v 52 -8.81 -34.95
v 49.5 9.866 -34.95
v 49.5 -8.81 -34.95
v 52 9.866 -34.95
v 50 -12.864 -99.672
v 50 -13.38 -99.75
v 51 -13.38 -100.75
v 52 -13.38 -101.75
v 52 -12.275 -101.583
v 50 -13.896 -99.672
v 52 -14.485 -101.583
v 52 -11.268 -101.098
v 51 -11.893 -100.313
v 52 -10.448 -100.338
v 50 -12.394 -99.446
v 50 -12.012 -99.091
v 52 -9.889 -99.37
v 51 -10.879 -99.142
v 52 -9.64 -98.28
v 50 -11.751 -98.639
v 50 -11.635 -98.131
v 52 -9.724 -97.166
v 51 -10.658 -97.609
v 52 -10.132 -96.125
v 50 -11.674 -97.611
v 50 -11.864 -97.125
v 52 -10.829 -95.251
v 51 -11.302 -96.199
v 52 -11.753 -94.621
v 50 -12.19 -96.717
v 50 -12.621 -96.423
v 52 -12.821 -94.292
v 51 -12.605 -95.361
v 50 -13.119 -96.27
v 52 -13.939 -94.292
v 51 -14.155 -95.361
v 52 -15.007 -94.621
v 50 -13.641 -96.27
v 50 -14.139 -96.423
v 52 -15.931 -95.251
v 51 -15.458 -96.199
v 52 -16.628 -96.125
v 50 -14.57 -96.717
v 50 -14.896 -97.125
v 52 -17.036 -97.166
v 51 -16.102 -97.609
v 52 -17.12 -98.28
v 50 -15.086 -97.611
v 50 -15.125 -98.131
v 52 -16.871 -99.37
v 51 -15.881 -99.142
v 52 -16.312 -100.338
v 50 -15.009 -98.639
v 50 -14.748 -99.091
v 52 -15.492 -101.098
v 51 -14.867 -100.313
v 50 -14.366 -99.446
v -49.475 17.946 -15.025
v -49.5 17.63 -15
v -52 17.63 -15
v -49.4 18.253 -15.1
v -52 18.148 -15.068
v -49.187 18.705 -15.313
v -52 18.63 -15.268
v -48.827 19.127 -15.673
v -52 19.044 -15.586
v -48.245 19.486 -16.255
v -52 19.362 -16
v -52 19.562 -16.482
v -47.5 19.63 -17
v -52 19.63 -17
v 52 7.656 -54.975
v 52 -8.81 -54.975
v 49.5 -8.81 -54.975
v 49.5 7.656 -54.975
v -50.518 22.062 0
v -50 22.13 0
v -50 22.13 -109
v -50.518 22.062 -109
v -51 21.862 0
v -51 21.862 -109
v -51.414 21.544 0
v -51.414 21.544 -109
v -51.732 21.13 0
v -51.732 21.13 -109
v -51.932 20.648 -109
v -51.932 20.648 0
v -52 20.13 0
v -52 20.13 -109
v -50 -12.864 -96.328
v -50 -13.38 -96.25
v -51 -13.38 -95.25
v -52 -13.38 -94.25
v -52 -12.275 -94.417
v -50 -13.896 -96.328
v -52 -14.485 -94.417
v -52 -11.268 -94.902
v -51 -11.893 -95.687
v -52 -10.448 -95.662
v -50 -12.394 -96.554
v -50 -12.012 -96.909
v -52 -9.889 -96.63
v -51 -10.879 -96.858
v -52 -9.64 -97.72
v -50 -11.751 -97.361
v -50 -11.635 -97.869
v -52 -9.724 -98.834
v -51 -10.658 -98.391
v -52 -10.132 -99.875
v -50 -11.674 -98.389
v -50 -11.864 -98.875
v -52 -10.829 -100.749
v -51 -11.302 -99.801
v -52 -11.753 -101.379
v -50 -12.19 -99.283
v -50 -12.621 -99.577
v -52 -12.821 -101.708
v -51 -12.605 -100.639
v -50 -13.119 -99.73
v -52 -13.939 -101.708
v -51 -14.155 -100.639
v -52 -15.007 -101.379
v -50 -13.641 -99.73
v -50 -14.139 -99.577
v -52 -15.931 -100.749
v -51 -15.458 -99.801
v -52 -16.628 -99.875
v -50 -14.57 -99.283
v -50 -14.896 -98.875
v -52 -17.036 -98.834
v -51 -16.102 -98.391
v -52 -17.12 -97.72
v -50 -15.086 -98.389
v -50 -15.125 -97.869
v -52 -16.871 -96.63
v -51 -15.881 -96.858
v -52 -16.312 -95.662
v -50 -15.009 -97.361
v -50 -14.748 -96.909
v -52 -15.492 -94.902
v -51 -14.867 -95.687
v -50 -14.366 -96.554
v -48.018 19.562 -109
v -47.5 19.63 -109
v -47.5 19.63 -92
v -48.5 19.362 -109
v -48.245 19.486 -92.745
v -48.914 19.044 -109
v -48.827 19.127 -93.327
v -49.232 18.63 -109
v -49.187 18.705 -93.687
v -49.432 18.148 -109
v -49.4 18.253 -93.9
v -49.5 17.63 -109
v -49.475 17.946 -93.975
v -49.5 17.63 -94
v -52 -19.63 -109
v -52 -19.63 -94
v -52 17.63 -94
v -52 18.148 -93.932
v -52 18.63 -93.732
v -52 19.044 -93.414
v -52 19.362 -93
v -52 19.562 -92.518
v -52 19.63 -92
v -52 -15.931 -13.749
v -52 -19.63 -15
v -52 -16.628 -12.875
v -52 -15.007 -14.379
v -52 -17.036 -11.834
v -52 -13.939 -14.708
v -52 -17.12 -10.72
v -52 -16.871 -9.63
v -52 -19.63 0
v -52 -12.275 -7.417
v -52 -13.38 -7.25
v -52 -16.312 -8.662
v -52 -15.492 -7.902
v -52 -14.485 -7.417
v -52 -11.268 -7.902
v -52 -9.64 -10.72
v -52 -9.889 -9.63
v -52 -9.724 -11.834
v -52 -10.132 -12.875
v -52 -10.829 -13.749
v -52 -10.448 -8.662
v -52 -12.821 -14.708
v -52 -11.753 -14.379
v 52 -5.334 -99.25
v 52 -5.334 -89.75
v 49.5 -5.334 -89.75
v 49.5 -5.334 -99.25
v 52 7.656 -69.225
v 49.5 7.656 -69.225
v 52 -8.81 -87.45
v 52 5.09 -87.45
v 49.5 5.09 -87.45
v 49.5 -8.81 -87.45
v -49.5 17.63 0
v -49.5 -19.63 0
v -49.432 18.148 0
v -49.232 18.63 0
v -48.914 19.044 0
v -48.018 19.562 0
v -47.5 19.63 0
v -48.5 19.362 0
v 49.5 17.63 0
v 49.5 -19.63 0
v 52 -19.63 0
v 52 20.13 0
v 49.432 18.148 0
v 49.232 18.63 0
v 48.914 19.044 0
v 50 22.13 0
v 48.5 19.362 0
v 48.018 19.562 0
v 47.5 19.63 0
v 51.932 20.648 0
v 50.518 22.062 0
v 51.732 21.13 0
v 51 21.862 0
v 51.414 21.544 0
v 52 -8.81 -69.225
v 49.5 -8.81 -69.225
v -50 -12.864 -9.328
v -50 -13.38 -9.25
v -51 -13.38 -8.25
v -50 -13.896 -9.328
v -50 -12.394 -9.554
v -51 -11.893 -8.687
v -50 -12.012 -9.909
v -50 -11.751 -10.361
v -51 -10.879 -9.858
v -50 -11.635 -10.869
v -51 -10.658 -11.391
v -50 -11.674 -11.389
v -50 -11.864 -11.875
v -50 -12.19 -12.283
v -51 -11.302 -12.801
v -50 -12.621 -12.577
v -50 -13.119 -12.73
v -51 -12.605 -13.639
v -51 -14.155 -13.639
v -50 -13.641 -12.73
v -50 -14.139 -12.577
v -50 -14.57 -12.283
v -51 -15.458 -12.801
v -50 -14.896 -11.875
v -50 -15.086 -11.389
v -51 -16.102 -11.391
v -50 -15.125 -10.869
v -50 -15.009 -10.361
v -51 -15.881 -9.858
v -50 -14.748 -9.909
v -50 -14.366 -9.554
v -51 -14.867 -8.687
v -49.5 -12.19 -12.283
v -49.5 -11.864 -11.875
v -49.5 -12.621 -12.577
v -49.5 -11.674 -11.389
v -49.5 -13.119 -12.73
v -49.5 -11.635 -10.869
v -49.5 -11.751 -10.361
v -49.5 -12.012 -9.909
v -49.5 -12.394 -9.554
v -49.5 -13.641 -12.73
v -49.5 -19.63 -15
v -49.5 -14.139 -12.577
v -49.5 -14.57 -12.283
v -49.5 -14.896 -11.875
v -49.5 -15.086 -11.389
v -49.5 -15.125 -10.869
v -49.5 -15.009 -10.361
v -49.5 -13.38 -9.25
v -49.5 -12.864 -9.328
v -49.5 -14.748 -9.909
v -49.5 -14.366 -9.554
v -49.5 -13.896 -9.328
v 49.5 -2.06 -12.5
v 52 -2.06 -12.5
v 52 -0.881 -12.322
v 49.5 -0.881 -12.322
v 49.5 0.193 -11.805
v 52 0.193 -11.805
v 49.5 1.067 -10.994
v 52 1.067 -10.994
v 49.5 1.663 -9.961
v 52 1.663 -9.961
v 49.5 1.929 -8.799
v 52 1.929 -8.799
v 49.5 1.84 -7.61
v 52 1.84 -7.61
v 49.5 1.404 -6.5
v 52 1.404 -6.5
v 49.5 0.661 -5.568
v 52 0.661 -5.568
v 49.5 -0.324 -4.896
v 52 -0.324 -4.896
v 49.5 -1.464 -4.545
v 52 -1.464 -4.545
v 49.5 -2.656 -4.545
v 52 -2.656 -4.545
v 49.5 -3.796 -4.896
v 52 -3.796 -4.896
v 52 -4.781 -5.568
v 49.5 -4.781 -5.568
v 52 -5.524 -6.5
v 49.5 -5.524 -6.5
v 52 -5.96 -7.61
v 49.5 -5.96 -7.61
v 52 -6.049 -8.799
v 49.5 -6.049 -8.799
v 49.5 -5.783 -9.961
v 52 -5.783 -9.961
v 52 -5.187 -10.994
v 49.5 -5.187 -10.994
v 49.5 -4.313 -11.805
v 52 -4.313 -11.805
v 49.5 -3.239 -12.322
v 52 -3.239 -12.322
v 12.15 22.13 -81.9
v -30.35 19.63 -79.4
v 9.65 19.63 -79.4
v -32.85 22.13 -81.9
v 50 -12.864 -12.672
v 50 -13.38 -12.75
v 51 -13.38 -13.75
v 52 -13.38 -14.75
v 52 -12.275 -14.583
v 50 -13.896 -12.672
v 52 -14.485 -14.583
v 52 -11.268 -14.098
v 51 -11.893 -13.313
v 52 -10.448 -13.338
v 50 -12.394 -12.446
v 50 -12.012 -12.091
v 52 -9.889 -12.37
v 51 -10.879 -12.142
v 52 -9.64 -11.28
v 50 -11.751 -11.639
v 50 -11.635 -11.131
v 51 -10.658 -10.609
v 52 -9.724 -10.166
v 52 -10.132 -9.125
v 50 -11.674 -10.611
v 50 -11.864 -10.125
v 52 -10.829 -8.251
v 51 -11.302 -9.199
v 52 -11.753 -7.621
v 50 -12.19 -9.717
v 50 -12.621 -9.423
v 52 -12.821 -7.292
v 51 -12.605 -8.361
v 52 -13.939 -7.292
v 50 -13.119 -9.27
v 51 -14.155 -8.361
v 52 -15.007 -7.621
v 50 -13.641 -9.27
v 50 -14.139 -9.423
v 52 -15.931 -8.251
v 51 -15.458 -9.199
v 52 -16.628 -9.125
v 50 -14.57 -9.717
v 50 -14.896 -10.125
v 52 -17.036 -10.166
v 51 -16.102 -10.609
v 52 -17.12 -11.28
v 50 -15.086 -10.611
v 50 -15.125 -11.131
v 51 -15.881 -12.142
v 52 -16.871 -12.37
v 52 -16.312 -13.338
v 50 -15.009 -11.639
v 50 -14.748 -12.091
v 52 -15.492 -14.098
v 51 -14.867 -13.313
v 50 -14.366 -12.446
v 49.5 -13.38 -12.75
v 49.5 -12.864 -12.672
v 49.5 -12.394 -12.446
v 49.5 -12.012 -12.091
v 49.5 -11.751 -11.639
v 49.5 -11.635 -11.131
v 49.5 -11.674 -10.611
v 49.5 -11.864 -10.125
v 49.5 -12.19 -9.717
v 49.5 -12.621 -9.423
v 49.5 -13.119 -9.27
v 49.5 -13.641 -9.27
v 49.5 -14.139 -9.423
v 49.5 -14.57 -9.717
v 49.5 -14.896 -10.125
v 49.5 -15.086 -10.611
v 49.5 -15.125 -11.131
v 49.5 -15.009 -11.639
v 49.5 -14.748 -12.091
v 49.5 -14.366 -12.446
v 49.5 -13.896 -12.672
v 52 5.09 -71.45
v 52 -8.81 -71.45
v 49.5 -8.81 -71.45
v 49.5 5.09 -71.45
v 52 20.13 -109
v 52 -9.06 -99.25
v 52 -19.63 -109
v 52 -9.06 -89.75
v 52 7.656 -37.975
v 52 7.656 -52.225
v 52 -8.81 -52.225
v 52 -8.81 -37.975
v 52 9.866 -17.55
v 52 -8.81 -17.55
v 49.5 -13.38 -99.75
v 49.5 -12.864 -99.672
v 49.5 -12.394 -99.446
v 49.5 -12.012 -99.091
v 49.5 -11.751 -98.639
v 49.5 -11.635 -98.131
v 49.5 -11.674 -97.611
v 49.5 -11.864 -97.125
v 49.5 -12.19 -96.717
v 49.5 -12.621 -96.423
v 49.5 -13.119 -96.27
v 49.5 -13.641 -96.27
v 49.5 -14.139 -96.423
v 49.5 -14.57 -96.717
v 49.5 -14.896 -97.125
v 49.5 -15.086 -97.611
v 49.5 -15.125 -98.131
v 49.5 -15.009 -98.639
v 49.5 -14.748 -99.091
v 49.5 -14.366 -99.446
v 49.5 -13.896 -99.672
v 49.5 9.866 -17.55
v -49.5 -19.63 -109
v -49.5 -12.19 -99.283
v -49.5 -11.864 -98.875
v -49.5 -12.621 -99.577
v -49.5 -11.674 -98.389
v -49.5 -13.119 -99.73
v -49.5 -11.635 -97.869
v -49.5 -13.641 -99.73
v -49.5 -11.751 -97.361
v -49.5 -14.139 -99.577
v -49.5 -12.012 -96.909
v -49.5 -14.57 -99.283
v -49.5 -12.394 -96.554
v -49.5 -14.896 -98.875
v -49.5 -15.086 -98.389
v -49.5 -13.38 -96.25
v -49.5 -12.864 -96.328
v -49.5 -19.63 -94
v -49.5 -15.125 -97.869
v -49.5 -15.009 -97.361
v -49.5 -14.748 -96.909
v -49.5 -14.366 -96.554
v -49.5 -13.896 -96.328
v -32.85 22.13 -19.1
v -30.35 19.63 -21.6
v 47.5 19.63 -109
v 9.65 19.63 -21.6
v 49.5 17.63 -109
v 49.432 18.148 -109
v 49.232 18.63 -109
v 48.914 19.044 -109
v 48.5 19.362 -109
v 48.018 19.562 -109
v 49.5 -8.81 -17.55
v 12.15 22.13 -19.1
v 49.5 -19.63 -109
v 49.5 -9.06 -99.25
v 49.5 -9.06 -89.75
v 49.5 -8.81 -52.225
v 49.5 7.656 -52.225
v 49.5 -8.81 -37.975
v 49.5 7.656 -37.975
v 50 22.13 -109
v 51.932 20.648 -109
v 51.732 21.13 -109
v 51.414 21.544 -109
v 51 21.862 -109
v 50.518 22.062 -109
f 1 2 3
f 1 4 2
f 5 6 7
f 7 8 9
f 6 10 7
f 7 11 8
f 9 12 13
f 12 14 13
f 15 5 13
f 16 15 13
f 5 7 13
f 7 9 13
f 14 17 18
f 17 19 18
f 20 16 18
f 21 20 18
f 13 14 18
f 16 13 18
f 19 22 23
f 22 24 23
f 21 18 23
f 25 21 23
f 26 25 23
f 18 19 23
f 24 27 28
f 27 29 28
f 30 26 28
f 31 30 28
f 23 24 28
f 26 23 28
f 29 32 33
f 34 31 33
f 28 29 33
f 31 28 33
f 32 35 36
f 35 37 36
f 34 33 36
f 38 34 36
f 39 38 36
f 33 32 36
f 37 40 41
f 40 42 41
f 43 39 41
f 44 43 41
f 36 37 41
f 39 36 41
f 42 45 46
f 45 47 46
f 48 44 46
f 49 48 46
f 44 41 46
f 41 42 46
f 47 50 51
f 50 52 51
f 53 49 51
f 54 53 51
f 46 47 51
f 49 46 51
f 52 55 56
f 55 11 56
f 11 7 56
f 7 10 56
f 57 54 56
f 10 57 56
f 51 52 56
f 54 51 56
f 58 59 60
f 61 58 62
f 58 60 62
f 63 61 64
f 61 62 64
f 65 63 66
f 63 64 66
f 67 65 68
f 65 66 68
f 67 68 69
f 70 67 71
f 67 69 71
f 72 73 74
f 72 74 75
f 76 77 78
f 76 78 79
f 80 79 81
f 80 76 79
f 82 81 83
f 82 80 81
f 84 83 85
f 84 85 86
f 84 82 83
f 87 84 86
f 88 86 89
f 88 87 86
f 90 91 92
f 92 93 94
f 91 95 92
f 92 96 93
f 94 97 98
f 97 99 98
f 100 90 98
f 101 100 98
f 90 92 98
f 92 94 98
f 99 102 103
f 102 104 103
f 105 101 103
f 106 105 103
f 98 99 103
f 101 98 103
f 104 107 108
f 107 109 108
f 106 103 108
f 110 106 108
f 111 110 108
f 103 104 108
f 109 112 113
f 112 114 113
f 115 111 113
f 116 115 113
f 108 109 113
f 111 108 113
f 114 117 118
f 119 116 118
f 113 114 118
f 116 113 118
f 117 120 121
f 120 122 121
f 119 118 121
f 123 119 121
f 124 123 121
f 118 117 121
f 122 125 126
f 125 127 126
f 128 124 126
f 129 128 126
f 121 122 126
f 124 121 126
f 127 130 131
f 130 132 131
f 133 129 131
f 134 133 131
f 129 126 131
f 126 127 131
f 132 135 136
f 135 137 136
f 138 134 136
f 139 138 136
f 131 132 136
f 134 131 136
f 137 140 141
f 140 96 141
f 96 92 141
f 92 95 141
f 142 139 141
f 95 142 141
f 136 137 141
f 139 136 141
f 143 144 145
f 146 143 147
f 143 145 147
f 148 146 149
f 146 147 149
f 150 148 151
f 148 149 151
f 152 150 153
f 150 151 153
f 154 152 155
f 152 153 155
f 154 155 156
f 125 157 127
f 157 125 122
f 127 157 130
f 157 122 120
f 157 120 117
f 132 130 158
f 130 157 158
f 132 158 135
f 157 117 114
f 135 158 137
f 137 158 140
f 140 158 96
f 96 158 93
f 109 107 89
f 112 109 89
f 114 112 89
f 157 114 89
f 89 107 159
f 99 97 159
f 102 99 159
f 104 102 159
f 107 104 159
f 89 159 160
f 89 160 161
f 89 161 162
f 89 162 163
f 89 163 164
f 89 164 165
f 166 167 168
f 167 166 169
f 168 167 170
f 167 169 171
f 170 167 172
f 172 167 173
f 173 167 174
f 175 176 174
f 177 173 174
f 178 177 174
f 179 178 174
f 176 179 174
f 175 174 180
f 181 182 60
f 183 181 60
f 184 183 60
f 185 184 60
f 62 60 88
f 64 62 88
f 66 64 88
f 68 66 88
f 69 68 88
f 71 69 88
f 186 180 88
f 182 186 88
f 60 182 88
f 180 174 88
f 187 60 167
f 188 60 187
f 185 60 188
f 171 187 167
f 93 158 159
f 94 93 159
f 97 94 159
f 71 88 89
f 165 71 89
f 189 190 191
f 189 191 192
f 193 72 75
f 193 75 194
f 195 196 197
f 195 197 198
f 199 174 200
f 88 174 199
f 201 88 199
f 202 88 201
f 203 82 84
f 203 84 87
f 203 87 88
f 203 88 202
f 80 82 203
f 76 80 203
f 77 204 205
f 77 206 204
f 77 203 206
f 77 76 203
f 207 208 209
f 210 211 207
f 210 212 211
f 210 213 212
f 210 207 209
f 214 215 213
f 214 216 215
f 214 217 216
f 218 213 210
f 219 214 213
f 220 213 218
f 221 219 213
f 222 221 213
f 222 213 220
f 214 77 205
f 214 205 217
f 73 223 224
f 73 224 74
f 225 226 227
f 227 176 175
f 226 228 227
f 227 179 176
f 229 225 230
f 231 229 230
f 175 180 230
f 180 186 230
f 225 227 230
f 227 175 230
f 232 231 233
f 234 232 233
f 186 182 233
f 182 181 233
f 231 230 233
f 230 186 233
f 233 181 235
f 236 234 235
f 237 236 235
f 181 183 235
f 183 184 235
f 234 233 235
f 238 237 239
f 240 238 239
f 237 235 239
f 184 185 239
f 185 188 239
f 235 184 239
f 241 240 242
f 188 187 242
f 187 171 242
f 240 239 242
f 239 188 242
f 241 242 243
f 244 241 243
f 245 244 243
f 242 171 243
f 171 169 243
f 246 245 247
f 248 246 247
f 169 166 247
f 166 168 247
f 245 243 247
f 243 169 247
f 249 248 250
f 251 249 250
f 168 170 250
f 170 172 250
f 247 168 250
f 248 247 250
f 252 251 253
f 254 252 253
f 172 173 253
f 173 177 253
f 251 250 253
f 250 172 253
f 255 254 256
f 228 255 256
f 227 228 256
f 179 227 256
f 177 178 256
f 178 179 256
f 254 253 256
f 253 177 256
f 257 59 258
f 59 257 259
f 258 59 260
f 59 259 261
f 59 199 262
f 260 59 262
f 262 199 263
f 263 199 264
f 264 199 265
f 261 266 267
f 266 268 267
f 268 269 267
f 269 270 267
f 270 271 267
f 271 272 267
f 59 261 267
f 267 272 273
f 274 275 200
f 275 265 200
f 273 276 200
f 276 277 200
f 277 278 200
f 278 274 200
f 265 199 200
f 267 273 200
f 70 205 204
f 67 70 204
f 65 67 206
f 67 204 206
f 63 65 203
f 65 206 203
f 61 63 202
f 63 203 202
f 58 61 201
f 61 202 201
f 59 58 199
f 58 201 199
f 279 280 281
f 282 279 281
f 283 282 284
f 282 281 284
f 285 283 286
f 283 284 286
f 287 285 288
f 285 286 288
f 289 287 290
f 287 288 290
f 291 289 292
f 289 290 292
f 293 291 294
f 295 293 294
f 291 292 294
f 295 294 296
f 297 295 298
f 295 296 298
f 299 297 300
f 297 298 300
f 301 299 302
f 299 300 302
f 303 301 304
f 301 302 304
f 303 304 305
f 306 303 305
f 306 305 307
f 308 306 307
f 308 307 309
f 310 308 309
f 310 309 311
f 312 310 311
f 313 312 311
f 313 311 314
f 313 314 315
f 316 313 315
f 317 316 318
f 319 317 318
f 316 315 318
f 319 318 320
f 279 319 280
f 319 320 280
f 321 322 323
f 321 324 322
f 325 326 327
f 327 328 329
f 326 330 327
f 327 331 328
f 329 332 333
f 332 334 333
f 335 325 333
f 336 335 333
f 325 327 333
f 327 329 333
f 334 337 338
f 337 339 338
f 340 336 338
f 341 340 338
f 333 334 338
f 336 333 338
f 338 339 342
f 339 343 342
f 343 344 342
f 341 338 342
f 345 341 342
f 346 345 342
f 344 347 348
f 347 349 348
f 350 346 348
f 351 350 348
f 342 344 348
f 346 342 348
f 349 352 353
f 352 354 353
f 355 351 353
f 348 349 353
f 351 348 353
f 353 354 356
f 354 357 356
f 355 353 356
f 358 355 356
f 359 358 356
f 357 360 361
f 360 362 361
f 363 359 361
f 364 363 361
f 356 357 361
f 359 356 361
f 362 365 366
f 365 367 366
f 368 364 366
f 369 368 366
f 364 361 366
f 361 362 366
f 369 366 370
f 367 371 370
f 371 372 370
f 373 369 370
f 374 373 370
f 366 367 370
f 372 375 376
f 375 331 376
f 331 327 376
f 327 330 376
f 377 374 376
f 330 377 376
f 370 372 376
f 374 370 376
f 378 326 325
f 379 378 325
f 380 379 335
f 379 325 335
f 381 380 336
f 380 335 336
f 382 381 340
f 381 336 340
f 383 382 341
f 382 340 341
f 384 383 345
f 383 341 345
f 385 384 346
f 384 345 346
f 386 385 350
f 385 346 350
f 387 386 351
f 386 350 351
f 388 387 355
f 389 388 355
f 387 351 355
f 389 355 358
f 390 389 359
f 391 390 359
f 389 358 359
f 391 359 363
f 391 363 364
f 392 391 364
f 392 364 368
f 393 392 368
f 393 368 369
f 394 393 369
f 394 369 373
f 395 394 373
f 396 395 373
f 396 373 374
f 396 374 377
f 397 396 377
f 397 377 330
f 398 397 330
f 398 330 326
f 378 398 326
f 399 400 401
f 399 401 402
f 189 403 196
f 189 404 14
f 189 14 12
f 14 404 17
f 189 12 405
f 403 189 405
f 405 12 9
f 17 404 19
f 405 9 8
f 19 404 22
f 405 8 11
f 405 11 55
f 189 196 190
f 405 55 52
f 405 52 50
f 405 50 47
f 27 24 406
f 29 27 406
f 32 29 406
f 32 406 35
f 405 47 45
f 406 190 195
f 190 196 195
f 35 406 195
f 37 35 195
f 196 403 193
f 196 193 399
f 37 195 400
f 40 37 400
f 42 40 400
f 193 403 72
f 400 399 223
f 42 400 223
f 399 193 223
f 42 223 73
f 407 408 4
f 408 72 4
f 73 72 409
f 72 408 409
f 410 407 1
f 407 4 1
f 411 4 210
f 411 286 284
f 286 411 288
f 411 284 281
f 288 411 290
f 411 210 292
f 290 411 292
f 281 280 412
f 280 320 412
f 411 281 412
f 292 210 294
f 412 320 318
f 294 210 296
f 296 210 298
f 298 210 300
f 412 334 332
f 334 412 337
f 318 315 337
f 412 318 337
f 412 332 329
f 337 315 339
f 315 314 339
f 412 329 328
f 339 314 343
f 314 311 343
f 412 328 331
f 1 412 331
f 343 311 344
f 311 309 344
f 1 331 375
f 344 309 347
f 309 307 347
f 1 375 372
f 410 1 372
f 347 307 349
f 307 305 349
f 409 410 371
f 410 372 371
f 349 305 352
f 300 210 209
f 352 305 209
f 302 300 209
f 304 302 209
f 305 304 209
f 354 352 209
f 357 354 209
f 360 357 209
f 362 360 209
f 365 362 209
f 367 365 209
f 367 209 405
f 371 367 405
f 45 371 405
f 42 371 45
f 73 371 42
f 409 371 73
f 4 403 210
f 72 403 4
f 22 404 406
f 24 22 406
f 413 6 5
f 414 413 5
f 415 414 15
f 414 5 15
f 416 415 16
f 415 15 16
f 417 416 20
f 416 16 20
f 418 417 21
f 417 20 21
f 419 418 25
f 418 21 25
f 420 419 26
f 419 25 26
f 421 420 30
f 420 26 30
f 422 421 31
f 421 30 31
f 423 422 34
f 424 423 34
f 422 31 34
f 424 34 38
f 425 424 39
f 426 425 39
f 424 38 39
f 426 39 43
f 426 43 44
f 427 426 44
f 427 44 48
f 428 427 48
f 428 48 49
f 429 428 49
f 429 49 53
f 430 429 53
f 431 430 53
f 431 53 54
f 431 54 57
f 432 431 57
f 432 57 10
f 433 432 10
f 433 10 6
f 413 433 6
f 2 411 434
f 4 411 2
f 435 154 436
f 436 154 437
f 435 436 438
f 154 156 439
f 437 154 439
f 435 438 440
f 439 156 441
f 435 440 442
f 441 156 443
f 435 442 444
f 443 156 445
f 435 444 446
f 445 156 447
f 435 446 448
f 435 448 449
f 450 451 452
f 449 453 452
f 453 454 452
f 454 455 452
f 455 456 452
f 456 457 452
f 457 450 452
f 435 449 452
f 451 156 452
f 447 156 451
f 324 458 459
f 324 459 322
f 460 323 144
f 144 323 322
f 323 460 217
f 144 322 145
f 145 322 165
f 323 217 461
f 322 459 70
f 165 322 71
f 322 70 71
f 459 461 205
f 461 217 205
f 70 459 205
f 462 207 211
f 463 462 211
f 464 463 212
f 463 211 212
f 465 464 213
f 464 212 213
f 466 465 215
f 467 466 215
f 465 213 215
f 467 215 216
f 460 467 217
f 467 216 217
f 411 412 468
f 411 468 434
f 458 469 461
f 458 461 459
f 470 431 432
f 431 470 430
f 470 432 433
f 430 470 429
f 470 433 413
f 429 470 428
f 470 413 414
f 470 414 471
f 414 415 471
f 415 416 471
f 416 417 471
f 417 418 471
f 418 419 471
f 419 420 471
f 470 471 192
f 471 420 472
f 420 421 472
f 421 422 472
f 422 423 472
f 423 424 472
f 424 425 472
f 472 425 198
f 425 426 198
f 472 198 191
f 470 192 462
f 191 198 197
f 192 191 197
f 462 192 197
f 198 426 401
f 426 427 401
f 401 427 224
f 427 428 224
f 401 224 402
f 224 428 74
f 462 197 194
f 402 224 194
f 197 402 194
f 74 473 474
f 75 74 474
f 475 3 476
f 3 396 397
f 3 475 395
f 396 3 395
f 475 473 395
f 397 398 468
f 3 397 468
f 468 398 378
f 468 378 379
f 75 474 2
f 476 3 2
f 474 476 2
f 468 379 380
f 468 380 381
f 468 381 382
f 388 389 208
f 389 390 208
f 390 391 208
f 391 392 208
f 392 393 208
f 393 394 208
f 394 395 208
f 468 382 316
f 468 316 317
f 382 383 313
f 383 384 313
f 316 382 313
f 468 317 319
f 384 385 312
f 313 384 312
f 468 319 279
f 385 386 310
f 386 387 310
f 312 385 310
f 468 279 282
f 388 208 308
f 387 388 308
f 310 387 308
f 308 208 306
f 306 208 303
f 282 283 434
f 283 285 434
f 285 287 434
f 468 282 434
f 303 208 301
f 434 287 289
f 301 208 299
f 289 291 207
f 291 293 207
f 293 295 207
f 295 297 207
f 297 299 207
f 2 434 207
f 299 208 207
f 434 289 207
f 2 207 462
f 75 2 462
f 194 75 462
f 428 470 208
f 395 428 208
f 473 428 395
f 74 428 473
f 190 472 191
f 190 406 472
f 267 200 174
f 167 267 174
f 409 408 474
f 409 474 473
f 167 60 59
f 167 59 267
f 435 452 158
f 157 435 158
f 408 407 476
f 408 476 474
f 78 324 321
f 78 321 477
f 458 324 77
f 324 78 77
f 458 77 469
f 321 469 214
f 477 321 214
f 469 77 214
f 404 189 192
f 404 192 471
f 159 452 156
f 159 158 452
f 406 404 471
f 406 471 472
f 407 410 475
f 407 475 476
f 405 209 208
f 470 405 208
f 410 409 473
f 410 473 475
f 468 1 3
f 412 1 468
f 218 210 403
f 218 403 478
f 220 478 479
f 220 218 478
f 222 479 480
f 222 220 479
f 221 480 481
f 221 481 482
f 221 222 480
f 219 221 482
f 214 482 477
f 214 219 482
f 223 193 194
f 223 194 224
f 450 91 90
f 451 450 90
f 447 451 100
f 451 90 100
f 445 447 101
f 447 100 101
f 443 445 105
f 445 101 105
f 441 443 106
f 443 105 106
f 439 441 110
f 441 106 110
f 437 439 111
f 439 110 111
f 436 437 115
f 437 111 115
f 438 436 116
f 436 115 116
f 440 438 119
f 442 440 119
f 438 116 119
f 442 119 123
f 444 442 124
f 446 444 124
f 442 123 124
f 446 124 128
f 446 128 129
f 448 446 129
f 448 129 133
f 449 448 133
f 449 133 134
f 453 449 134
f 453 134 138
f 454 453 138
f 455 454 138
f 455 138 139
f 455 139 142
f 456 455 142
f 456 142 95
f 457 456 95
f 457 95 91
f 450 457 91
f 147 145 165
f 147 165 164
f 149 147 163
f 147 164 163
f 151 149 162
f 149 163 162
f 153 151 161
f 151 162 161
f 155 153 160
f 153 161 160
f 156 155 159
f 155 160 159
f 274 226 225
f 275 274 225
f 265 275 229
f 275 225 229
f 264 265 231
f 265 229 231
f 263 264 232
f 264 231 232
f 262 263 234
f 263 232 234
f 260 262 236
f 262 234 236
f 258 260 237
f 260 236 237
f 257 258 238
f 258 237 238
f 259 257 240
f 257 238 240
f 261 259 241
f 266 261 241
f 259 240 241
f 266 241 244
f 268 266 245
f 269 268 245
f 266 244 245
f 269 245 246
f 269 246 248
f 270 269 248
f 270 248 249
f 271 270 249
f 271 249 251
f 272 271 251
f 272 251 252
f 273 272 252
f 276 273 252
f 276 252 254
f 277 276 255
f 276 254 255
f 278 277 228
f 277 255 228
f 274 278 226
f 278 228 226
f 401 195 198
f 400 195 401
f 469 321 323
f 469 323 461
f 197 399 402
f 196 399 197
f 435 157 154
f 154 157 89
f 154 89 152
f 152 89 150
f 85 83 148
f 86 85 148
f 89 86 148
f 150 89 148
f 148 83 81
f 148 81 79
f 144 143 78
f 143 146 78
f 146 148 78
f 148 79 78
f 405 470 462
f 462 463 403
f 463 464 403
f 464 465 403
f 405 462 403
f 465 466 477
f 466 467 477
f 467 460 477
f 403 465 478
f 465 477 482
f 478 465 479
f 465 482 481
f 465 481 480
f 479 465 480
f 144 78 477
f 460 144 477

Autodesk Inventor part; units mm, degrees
ref_plane "YZ Plane" through (0, 0, 0) normal (1, 0, 0) x (0, 1, 0)
sketch "Sketch1" plane through (0, 0, 0) normal (0, 0, 1) x (1, 0, 0)
  line L0 (47.5, 19.63) -> (-47.5, 19.63) projected
  arc A0 (-47.5, 19.63) -> (-49.5, 17.63) centre (-47.5, 17.63) ccw projected
  line L1 (-49.5, 17.63) -> (-49.5, -19.63) projected
  line L2 (49.5, -19.63) -> (49.5, 17.63) projected
  arc A1 (49.5, 17.63) -> (47.5, 19.63) centre (47.5, 17.63) ccw projected
  line L3 (-49.5, -19.63) -> (-52, -19.63)
  line L4 (-52, -19.63) -> (-52, 20.13)
  line L5 (-50, 22.13) -> (50, 22.13)
  line L6 (52, 20.13) -> (52, -19.63)
  line L7 (52, -19.63) -> (49.5, -19.63)
  arc A2 (-50, 22.13) -> (-52, 20.13) centre (-50, 20.13) ccw
  arc A3 (52, 20.13) -> (50, 22.13) centre (50, 20.13) ccw
  dimension "d0" = 2.5
  dimension "d1" = 2.5
  dimension "d2" = 2.5
  dimension "d3" = 2
ref_plane "Work Plane1" through (-49.5, -19.63, -109) normal (0, 0, -1) x (0, 1, 0)
extrude "Extrusion1" add sketch "Sketch1" against normal up to surface (109 mm away)
sketch "Sketch2" plane through (-50, 22.13, 0) normal (0, 1, 0) x (1, 0, 0)
  circle A0 centre (39.65, 50.5) radius 18.5 construction
  line L0 (58.85, 79.4) -> (20.45, 79.4) construction
  line L1 (20.45, 79.4) -> (20.45, 21.6) construction
  line L2 (58.85, 21.6) -> (58.85, 79.4) construction
  line L3 (20.45, 21.6) -> (58.85, 21.6) construction
  line L4 (20.15, 23.6) -> (20.15, 77.4) construction
  line L5 (59.15, 77.4) -> (59.15, 23.6) construction
  line L6 (20.15, 21.6) -> (59.15, 21.6) construction
  line L7 (59.15, 79.4) -> (20.15, 79.4) construction
  line L8 (20.15, 21.6) -> (59.15, 21.6)
  line L9 (59.15, 21.6) -> (59.15, 79.4)
  line L10 (59.15, 79.4) -> (20.15, 79.4)
  line L11 (20.15, 79.4) -> (20.15, 21.6)
  line L12 (59.65, 79.4) -> (19.65, 79.4)
  line L13 (19.65, 79.4) -> (19.65, 21.6)
  line L14 (19.65, 21.6) -> (59.65, 21.6)
  line L15 (59.65, 21.6) -> (59.65, 79.4)
  point P0 (50, 0)
  point P1 (59.65, 50.5)
  point P2 (59.15, 79.4)
  dimension "d43" = 40
  dimension "d44" = 39
  dimension "d45" = 0.5
extrude "Extrusion2" cut sketch "Sketch2" against normal up to surface (2.5 mm away)
chamfer "Chamfer1" distance 2.5 angle 45 4 edges at (-10.35, 22.13, -79.4) (-30.35, 22.13, -50.5) (9.65, 22.13, -50.5) (-10.35, 22.13, -21.6)
sketch "Sketch3" plane through (-52, -19.63, 0) normal (-1, 0, 0) x (0, 0, 1)
  line L0 (-94, 9.5) -> (-94, 37.26) projected
  arc A0 (-92, 39.26) -> (-94, 37.26) centre (-92, 37.26) ccw projected
  line L1 (-92, 39.26) -> (-17, 39.26) projected
  arc A1 (-15, 37.26) -> (-17, 39.26) centre (-17, 37.26) ccw projected
  line L2 (-15, 37.26) -> (-15, 9.5) projected
  line L3 (-94, 9.5) -> (-94, 0)
  line L4 (0, 0) -> (-109, 0) construction
  line L5 (-15, 9.5) -> (-15, 0)
  line L6 (-94, 0) -> (-15, 0)
  circle A2 centre (-98, 6.25) radius 1.5 construction
  circle A3 centre (-11, 6.25) radius 1.5 construction
  circle A4 centre (-98, 6.25) radius 1.75
  circle A5 centre (-11, 6.25) radius 1.75
  point P0 (0, 19.63)
  dimension "d13" = 3.5
  dimension "d14" = 3.5
ref_plane "Work Plane2" through (-47.0185, 3.2145, -3.5) normal (1, 0, 0) x (0, 1, 0)
extrude "Extrusion3" cut sketch "Sketch3" against normal up to surface (4.9815 mm away)
sketch "Sketch4" plane through (52, -19.63, 0) normal (1, 0, 0) x (0, 0, -1)
  circle A0 centre (98, 6.25) radius 1.5 construction
  circle A1 centre (11, 6.25) radius 1.5 construction
  arc A2 (72.9, 14.47) -> (72.9168, 14.38) centre (73.1508, 14.4702) ccw construction
  line L0 (72.9, 16.76) -> (72.9, 14.47) construction
  line L1 (72.9, 16.76) -> (72.9, 18.76) construction
  line L2 (72.9, 22.14) -> (72.9, 18.76) construction
  arc A3 (73.15, 22.39) -> (72.9, 22.14) centre (73.15, 22.14) ccw construction
  line L3 (73.15, 22.39) -> (85.55, 22.39) construction
  arc A4 (85.8, 22.14) -> (85.55, 22.39) centre (85.55, 22.14) ccw construction
  line L4 (85.8, 22.14) -> (85.8, 18.76) construction
  line L5 (85.8, 18.76) -> (85.8, 16.76) construction
  line L6 (85.8, 16.76) -> (85.8, 14.47) construction
  arc A5 (85.7832, 14.38) -> (85.8, 14.47) centre (85.5492, 14.4702) ccw construction
  line L7 (85.7832, 14.38) -> (86.5, 14.38) construction
  line L8 (86.5, 14.38) -> (86.5, 12.03) construction
  line L9 (81.88, 12.03) -> (86.5, 12.03) construction
  line L10 (81.88, 12.03) -> (81.88, 11.42) construction
  line L11 (81.88, 11.42) -> (86.45, 11.42) construction
  line L12 (87.2, 11.42) -> (86.45, 11.42) construction
  line L13 (87.2, 24.47) -> (87.2, 11.42) construction
  line L14 (87.2, 24.52) -> (87.2, 24.47) construction
  line L15 (87.2, 24.52) -> (71.7, 24.52) construction
  line L16 (71.7, 24.52) -> (71.7, 24.47) construction
  line L17 (71.7, 24.47) -> (71.7, 11.42) construction
  line L18 (71.7, 11.42) -> (72.45, 11.42) construction
  line L19 (72.45, 11.42) -> (76.82, 11.42) construction
  line L20 (76.82, 12.03) -> (76.82, 11.42) construction
  line L21 (72.3, 12.03) -> (76.82, 12.03) construction
  line L22 (72.3, 14.38) -> (72.3, 12.03) construction
  line L23 (72.3, 14.38) -> (72.9168, 14.38) construction
  line L24 (68.675, 20.9412) -> (68.975, 20.9412) construction
  line L25 (68.975, 20.9412) -> (68.975, 26.4362) construction
  arc A6 (68.975, 26.4362) -> (68.375, 27.0362) centre (68.375, 26.4362) ccw construction
  line L26 (68.375, 27.0362) -> (55.825, 27.0362) construction
  arc A7 (55.825, 27.0362) -> (55.225, 26.4362) centre (55.825, 26.4362) ccw construction
  line L27 (55.225, 26.4362) -> (55.225, 20.9412) construction
  line L28 (55.225, 20.9412) -> (55.525, 20.9412) construction
  line L29 (55.525, 26.4362) -> (55.525, 20.9412) construction
  arc A8 (55.825, 26.7362) -> (55.525, 26.4362) centre (55.825, 26.4362) ccw construction
  line L30 (68.375, 26.7362) -> (55.825, 26.7362) construction
  arc A9 (68.675, 26.4362) -> (68.375, 26.7362) centre (68.375, 26.4362) ccw construction
  line L31 (68.675, 26.4362) -> (68.675, 20.9412) construction
  line L32 (51.675, 20.9412) -> (51.975, 20.9412) construction
  line L33 (51.975, 20.9412) -> (51.975, 26.4362) construction
  arc A10 (51.975, 26.4362) -> (51.375, 27.0362) centre (51.375, 26.4362) ccw construction
  line L34 (51.375, 27.0362) -> (38.825, 27.0362) construction
  arc A11 (38.825, 27.0362) -> (38.225, 26.4362) centre (38.825, 26.4362) ccw construction
  line L35 (38.225, 26.4362) -> (38.225, 20.9412) construction
  line L36 (38.225, 20.9412) -> (38.525, 20.9412) construction
  line L37 (38.525, 26.4362) -> (38.525, 20.9412) construction
  arc A12 (38.825, 26.7362) -> (38.525, 26.4362) centre (38.825, 26.4362) ccw construction
  line L38 (51.375, 26.7362) -> (38.825, 26.7362) construction
  arc A13 (51.675, 26.4362) -> (51.375, 26.7362) centre (51.375, 26.4362) ccw construction
  line L39 (51.675, 26.4362) -> (51.675, 20.9412) construction
  line L40 (34.7, 28.373) -> (34.7, 24.4594) construction
  line L41 (30.79, 29.2462) -> (33.9, 29.2462) construction
  line L42 (18.6, 29.2462) -> (21.71, 29.2462) construction
  line L43 (17.8, 25.8062) -> (17.8, 28.4462) construction
  line L44 (17.8, 12.6412) -> (17.8, 25.8412) construction
  line L45 (34.7, 12.6412) -> (34.7, 24.4412) construction
  line L46 (3.1, 11.07) -> (101.9, 11.07) construction
  circle A14 centre (8.5, 17.57) radius 4
  circle A15 centre (11, 6.25) radius 1.75
  circle A16 centre (98, 6.25) radius 1.75
  line L47 (17.55, 29.4962) -> (34.95, 29.4962)
  line L48 (34.95, 29.4962) -> (34.95, 10.82)
  line L49 (34.95, 10.82) -> (17.55, 10.82)
  line L50 (17.55, 10.82) -> (17.55, 29.4962)
  line L51 (37.975, 27.2862) -> (52.225, 27.2862)
  line L52 (52.225, 27.2862) -> (52.225, 10.82)
  line L53 (52.225, 10.82) -> (37.975, 10.82)
  line L54 (37.975, 10.82) -> (37.975, 27.2862)
  line L55 (54.975, 27.2862) -> (69.225, 27.2862)
  line L56 (69.225, 27.2862) -> (69.225, 10.82)
  line L57 (69.225, 10.82) -> (54.975, 10.82)
  line L58 (54.975, 10.82) -> (54.975, 27.2862)
  line L59 (71.45, 24.72) -> (87.45, 24.72)
  line L60 (87.45, 24.72) -> (87.45, 10.82)
  line L61 (87.45, 10.82) -> (71.45, 10.82)
  line L62 (71.45, 10.82) -> (71.45, 24.72)
  line L63 (90.5, 13.2962) -> (90.5, 12.7462) construction
  line L64 (91.35, 13.7962) -> (91, 13.7962) construction
  line L65 (98, 13.7962) -> (97.6, 13.7962) construction
  line L66 (98.5, 13.2962) -> (98.5, 12.7462) construction
  line L67 (89.75, 14.2962) -> (99.25, 14.2962)
  line L68 (99.25, 14.2962) -> (99.25, 10.57)
  line L69 (99.25, 10.57) -> (89.75, 10.57)
  line L70 (89.75, 10.57) -> (89.75, 14.2962)
  line L71 (71.7, 24.47) -> (87.2, 24.47) construction
  line L72 (87.2, 24.47) -> (87.2, 11.07) construction
  line L73 (87.2, 11.07) -> (71.7, 11.07) construction
  line L74 (71.7, 11.07) -> (71.7, 24.47) construction
  circle A17 centre (8.5, 17.57) radius 3.2 projected
  point P0 (0, 19.63)
  point P1 (17.8, 27.1262)
  point P2 (68.975, 23.6887)
  point P3 (91.175, 13.7962)
  point P4 (90.5, 13.0212)
  point P5 (98.5, 13.0212)
  dimension "d15" = 8
  dimension "d16" = 3.5
  dimension "d17" = 3.5
  dimension "d18" = 0.25
  dimension "d19" = 0.25
  dimension "d20" = 0.25
  dimension "d21" = 0.25
  dimension "d22" = 0.25
  dimension "d23" = 0.25
  dimension "d24" = 0.25
  dimension "d25" = 0.25
  dimension "d26" = 0.25
  dimension "d27" = 0.25
  dimension "d28" = 0.25
  dimension "d29" = 0.25
  dimension "d30" = 0.25
  dimension "d31" = 0.25
  dimension "d32" = 0.25
  dimension "d33" = 0.25
  dimension "d34" = 0.5
  dimension "d35" = 0.5
  dimension "d36" = 0.75
  dimension "d37" = 0.75
extrude "Extrusion4" cut sketch "Sketch4" against normal up to surface (2.5 mm away) contours A14 | A15 | A16 | L47 L48 L49 L50 | L51 L52 L53 L54 | L55 L56 L57 L58 | L59 L60 L61 L62 | L67 L68 L69 L70 | A17
chamfer "Chamfer2" distance 2 angle 45 4 edges at (52, -13.38, -9.25) (52, -13.38, -96.25) (-52, -13.38, -99.75) (-52, -13.38, -12.75)
equation "\"d1\" = d0"
equation "\"d2\" = d0"
equation "\"d45\" = -0.5 * d44 + 0.5 * d43"
equation "\"d14\" = d13"
equation "\"d17\" = d16"
equation "\"d19\" = d18"
equation "\"d20\" = d18"
equation "\"d21\" = d18"
equation "\"d22\" = d19"
equation "\"d23\" = d20"
equation "\"d24\" = d23"
equation "\"d25\" = d24"
equation "\"d26\" = d24"
equation "\"d27\" = d26"
equation "\"d28\" = d26"
equation "\"d29\" = d25"
equation "\"d30\" = d29"
equation "\"d31\" = d27"
equation "\"d32\" = d31"
equation "\"d33\" = d31"
equation "\"d34\" = d35"
equation "\"d37\" = d36"
properties part number "Shroud Top"
